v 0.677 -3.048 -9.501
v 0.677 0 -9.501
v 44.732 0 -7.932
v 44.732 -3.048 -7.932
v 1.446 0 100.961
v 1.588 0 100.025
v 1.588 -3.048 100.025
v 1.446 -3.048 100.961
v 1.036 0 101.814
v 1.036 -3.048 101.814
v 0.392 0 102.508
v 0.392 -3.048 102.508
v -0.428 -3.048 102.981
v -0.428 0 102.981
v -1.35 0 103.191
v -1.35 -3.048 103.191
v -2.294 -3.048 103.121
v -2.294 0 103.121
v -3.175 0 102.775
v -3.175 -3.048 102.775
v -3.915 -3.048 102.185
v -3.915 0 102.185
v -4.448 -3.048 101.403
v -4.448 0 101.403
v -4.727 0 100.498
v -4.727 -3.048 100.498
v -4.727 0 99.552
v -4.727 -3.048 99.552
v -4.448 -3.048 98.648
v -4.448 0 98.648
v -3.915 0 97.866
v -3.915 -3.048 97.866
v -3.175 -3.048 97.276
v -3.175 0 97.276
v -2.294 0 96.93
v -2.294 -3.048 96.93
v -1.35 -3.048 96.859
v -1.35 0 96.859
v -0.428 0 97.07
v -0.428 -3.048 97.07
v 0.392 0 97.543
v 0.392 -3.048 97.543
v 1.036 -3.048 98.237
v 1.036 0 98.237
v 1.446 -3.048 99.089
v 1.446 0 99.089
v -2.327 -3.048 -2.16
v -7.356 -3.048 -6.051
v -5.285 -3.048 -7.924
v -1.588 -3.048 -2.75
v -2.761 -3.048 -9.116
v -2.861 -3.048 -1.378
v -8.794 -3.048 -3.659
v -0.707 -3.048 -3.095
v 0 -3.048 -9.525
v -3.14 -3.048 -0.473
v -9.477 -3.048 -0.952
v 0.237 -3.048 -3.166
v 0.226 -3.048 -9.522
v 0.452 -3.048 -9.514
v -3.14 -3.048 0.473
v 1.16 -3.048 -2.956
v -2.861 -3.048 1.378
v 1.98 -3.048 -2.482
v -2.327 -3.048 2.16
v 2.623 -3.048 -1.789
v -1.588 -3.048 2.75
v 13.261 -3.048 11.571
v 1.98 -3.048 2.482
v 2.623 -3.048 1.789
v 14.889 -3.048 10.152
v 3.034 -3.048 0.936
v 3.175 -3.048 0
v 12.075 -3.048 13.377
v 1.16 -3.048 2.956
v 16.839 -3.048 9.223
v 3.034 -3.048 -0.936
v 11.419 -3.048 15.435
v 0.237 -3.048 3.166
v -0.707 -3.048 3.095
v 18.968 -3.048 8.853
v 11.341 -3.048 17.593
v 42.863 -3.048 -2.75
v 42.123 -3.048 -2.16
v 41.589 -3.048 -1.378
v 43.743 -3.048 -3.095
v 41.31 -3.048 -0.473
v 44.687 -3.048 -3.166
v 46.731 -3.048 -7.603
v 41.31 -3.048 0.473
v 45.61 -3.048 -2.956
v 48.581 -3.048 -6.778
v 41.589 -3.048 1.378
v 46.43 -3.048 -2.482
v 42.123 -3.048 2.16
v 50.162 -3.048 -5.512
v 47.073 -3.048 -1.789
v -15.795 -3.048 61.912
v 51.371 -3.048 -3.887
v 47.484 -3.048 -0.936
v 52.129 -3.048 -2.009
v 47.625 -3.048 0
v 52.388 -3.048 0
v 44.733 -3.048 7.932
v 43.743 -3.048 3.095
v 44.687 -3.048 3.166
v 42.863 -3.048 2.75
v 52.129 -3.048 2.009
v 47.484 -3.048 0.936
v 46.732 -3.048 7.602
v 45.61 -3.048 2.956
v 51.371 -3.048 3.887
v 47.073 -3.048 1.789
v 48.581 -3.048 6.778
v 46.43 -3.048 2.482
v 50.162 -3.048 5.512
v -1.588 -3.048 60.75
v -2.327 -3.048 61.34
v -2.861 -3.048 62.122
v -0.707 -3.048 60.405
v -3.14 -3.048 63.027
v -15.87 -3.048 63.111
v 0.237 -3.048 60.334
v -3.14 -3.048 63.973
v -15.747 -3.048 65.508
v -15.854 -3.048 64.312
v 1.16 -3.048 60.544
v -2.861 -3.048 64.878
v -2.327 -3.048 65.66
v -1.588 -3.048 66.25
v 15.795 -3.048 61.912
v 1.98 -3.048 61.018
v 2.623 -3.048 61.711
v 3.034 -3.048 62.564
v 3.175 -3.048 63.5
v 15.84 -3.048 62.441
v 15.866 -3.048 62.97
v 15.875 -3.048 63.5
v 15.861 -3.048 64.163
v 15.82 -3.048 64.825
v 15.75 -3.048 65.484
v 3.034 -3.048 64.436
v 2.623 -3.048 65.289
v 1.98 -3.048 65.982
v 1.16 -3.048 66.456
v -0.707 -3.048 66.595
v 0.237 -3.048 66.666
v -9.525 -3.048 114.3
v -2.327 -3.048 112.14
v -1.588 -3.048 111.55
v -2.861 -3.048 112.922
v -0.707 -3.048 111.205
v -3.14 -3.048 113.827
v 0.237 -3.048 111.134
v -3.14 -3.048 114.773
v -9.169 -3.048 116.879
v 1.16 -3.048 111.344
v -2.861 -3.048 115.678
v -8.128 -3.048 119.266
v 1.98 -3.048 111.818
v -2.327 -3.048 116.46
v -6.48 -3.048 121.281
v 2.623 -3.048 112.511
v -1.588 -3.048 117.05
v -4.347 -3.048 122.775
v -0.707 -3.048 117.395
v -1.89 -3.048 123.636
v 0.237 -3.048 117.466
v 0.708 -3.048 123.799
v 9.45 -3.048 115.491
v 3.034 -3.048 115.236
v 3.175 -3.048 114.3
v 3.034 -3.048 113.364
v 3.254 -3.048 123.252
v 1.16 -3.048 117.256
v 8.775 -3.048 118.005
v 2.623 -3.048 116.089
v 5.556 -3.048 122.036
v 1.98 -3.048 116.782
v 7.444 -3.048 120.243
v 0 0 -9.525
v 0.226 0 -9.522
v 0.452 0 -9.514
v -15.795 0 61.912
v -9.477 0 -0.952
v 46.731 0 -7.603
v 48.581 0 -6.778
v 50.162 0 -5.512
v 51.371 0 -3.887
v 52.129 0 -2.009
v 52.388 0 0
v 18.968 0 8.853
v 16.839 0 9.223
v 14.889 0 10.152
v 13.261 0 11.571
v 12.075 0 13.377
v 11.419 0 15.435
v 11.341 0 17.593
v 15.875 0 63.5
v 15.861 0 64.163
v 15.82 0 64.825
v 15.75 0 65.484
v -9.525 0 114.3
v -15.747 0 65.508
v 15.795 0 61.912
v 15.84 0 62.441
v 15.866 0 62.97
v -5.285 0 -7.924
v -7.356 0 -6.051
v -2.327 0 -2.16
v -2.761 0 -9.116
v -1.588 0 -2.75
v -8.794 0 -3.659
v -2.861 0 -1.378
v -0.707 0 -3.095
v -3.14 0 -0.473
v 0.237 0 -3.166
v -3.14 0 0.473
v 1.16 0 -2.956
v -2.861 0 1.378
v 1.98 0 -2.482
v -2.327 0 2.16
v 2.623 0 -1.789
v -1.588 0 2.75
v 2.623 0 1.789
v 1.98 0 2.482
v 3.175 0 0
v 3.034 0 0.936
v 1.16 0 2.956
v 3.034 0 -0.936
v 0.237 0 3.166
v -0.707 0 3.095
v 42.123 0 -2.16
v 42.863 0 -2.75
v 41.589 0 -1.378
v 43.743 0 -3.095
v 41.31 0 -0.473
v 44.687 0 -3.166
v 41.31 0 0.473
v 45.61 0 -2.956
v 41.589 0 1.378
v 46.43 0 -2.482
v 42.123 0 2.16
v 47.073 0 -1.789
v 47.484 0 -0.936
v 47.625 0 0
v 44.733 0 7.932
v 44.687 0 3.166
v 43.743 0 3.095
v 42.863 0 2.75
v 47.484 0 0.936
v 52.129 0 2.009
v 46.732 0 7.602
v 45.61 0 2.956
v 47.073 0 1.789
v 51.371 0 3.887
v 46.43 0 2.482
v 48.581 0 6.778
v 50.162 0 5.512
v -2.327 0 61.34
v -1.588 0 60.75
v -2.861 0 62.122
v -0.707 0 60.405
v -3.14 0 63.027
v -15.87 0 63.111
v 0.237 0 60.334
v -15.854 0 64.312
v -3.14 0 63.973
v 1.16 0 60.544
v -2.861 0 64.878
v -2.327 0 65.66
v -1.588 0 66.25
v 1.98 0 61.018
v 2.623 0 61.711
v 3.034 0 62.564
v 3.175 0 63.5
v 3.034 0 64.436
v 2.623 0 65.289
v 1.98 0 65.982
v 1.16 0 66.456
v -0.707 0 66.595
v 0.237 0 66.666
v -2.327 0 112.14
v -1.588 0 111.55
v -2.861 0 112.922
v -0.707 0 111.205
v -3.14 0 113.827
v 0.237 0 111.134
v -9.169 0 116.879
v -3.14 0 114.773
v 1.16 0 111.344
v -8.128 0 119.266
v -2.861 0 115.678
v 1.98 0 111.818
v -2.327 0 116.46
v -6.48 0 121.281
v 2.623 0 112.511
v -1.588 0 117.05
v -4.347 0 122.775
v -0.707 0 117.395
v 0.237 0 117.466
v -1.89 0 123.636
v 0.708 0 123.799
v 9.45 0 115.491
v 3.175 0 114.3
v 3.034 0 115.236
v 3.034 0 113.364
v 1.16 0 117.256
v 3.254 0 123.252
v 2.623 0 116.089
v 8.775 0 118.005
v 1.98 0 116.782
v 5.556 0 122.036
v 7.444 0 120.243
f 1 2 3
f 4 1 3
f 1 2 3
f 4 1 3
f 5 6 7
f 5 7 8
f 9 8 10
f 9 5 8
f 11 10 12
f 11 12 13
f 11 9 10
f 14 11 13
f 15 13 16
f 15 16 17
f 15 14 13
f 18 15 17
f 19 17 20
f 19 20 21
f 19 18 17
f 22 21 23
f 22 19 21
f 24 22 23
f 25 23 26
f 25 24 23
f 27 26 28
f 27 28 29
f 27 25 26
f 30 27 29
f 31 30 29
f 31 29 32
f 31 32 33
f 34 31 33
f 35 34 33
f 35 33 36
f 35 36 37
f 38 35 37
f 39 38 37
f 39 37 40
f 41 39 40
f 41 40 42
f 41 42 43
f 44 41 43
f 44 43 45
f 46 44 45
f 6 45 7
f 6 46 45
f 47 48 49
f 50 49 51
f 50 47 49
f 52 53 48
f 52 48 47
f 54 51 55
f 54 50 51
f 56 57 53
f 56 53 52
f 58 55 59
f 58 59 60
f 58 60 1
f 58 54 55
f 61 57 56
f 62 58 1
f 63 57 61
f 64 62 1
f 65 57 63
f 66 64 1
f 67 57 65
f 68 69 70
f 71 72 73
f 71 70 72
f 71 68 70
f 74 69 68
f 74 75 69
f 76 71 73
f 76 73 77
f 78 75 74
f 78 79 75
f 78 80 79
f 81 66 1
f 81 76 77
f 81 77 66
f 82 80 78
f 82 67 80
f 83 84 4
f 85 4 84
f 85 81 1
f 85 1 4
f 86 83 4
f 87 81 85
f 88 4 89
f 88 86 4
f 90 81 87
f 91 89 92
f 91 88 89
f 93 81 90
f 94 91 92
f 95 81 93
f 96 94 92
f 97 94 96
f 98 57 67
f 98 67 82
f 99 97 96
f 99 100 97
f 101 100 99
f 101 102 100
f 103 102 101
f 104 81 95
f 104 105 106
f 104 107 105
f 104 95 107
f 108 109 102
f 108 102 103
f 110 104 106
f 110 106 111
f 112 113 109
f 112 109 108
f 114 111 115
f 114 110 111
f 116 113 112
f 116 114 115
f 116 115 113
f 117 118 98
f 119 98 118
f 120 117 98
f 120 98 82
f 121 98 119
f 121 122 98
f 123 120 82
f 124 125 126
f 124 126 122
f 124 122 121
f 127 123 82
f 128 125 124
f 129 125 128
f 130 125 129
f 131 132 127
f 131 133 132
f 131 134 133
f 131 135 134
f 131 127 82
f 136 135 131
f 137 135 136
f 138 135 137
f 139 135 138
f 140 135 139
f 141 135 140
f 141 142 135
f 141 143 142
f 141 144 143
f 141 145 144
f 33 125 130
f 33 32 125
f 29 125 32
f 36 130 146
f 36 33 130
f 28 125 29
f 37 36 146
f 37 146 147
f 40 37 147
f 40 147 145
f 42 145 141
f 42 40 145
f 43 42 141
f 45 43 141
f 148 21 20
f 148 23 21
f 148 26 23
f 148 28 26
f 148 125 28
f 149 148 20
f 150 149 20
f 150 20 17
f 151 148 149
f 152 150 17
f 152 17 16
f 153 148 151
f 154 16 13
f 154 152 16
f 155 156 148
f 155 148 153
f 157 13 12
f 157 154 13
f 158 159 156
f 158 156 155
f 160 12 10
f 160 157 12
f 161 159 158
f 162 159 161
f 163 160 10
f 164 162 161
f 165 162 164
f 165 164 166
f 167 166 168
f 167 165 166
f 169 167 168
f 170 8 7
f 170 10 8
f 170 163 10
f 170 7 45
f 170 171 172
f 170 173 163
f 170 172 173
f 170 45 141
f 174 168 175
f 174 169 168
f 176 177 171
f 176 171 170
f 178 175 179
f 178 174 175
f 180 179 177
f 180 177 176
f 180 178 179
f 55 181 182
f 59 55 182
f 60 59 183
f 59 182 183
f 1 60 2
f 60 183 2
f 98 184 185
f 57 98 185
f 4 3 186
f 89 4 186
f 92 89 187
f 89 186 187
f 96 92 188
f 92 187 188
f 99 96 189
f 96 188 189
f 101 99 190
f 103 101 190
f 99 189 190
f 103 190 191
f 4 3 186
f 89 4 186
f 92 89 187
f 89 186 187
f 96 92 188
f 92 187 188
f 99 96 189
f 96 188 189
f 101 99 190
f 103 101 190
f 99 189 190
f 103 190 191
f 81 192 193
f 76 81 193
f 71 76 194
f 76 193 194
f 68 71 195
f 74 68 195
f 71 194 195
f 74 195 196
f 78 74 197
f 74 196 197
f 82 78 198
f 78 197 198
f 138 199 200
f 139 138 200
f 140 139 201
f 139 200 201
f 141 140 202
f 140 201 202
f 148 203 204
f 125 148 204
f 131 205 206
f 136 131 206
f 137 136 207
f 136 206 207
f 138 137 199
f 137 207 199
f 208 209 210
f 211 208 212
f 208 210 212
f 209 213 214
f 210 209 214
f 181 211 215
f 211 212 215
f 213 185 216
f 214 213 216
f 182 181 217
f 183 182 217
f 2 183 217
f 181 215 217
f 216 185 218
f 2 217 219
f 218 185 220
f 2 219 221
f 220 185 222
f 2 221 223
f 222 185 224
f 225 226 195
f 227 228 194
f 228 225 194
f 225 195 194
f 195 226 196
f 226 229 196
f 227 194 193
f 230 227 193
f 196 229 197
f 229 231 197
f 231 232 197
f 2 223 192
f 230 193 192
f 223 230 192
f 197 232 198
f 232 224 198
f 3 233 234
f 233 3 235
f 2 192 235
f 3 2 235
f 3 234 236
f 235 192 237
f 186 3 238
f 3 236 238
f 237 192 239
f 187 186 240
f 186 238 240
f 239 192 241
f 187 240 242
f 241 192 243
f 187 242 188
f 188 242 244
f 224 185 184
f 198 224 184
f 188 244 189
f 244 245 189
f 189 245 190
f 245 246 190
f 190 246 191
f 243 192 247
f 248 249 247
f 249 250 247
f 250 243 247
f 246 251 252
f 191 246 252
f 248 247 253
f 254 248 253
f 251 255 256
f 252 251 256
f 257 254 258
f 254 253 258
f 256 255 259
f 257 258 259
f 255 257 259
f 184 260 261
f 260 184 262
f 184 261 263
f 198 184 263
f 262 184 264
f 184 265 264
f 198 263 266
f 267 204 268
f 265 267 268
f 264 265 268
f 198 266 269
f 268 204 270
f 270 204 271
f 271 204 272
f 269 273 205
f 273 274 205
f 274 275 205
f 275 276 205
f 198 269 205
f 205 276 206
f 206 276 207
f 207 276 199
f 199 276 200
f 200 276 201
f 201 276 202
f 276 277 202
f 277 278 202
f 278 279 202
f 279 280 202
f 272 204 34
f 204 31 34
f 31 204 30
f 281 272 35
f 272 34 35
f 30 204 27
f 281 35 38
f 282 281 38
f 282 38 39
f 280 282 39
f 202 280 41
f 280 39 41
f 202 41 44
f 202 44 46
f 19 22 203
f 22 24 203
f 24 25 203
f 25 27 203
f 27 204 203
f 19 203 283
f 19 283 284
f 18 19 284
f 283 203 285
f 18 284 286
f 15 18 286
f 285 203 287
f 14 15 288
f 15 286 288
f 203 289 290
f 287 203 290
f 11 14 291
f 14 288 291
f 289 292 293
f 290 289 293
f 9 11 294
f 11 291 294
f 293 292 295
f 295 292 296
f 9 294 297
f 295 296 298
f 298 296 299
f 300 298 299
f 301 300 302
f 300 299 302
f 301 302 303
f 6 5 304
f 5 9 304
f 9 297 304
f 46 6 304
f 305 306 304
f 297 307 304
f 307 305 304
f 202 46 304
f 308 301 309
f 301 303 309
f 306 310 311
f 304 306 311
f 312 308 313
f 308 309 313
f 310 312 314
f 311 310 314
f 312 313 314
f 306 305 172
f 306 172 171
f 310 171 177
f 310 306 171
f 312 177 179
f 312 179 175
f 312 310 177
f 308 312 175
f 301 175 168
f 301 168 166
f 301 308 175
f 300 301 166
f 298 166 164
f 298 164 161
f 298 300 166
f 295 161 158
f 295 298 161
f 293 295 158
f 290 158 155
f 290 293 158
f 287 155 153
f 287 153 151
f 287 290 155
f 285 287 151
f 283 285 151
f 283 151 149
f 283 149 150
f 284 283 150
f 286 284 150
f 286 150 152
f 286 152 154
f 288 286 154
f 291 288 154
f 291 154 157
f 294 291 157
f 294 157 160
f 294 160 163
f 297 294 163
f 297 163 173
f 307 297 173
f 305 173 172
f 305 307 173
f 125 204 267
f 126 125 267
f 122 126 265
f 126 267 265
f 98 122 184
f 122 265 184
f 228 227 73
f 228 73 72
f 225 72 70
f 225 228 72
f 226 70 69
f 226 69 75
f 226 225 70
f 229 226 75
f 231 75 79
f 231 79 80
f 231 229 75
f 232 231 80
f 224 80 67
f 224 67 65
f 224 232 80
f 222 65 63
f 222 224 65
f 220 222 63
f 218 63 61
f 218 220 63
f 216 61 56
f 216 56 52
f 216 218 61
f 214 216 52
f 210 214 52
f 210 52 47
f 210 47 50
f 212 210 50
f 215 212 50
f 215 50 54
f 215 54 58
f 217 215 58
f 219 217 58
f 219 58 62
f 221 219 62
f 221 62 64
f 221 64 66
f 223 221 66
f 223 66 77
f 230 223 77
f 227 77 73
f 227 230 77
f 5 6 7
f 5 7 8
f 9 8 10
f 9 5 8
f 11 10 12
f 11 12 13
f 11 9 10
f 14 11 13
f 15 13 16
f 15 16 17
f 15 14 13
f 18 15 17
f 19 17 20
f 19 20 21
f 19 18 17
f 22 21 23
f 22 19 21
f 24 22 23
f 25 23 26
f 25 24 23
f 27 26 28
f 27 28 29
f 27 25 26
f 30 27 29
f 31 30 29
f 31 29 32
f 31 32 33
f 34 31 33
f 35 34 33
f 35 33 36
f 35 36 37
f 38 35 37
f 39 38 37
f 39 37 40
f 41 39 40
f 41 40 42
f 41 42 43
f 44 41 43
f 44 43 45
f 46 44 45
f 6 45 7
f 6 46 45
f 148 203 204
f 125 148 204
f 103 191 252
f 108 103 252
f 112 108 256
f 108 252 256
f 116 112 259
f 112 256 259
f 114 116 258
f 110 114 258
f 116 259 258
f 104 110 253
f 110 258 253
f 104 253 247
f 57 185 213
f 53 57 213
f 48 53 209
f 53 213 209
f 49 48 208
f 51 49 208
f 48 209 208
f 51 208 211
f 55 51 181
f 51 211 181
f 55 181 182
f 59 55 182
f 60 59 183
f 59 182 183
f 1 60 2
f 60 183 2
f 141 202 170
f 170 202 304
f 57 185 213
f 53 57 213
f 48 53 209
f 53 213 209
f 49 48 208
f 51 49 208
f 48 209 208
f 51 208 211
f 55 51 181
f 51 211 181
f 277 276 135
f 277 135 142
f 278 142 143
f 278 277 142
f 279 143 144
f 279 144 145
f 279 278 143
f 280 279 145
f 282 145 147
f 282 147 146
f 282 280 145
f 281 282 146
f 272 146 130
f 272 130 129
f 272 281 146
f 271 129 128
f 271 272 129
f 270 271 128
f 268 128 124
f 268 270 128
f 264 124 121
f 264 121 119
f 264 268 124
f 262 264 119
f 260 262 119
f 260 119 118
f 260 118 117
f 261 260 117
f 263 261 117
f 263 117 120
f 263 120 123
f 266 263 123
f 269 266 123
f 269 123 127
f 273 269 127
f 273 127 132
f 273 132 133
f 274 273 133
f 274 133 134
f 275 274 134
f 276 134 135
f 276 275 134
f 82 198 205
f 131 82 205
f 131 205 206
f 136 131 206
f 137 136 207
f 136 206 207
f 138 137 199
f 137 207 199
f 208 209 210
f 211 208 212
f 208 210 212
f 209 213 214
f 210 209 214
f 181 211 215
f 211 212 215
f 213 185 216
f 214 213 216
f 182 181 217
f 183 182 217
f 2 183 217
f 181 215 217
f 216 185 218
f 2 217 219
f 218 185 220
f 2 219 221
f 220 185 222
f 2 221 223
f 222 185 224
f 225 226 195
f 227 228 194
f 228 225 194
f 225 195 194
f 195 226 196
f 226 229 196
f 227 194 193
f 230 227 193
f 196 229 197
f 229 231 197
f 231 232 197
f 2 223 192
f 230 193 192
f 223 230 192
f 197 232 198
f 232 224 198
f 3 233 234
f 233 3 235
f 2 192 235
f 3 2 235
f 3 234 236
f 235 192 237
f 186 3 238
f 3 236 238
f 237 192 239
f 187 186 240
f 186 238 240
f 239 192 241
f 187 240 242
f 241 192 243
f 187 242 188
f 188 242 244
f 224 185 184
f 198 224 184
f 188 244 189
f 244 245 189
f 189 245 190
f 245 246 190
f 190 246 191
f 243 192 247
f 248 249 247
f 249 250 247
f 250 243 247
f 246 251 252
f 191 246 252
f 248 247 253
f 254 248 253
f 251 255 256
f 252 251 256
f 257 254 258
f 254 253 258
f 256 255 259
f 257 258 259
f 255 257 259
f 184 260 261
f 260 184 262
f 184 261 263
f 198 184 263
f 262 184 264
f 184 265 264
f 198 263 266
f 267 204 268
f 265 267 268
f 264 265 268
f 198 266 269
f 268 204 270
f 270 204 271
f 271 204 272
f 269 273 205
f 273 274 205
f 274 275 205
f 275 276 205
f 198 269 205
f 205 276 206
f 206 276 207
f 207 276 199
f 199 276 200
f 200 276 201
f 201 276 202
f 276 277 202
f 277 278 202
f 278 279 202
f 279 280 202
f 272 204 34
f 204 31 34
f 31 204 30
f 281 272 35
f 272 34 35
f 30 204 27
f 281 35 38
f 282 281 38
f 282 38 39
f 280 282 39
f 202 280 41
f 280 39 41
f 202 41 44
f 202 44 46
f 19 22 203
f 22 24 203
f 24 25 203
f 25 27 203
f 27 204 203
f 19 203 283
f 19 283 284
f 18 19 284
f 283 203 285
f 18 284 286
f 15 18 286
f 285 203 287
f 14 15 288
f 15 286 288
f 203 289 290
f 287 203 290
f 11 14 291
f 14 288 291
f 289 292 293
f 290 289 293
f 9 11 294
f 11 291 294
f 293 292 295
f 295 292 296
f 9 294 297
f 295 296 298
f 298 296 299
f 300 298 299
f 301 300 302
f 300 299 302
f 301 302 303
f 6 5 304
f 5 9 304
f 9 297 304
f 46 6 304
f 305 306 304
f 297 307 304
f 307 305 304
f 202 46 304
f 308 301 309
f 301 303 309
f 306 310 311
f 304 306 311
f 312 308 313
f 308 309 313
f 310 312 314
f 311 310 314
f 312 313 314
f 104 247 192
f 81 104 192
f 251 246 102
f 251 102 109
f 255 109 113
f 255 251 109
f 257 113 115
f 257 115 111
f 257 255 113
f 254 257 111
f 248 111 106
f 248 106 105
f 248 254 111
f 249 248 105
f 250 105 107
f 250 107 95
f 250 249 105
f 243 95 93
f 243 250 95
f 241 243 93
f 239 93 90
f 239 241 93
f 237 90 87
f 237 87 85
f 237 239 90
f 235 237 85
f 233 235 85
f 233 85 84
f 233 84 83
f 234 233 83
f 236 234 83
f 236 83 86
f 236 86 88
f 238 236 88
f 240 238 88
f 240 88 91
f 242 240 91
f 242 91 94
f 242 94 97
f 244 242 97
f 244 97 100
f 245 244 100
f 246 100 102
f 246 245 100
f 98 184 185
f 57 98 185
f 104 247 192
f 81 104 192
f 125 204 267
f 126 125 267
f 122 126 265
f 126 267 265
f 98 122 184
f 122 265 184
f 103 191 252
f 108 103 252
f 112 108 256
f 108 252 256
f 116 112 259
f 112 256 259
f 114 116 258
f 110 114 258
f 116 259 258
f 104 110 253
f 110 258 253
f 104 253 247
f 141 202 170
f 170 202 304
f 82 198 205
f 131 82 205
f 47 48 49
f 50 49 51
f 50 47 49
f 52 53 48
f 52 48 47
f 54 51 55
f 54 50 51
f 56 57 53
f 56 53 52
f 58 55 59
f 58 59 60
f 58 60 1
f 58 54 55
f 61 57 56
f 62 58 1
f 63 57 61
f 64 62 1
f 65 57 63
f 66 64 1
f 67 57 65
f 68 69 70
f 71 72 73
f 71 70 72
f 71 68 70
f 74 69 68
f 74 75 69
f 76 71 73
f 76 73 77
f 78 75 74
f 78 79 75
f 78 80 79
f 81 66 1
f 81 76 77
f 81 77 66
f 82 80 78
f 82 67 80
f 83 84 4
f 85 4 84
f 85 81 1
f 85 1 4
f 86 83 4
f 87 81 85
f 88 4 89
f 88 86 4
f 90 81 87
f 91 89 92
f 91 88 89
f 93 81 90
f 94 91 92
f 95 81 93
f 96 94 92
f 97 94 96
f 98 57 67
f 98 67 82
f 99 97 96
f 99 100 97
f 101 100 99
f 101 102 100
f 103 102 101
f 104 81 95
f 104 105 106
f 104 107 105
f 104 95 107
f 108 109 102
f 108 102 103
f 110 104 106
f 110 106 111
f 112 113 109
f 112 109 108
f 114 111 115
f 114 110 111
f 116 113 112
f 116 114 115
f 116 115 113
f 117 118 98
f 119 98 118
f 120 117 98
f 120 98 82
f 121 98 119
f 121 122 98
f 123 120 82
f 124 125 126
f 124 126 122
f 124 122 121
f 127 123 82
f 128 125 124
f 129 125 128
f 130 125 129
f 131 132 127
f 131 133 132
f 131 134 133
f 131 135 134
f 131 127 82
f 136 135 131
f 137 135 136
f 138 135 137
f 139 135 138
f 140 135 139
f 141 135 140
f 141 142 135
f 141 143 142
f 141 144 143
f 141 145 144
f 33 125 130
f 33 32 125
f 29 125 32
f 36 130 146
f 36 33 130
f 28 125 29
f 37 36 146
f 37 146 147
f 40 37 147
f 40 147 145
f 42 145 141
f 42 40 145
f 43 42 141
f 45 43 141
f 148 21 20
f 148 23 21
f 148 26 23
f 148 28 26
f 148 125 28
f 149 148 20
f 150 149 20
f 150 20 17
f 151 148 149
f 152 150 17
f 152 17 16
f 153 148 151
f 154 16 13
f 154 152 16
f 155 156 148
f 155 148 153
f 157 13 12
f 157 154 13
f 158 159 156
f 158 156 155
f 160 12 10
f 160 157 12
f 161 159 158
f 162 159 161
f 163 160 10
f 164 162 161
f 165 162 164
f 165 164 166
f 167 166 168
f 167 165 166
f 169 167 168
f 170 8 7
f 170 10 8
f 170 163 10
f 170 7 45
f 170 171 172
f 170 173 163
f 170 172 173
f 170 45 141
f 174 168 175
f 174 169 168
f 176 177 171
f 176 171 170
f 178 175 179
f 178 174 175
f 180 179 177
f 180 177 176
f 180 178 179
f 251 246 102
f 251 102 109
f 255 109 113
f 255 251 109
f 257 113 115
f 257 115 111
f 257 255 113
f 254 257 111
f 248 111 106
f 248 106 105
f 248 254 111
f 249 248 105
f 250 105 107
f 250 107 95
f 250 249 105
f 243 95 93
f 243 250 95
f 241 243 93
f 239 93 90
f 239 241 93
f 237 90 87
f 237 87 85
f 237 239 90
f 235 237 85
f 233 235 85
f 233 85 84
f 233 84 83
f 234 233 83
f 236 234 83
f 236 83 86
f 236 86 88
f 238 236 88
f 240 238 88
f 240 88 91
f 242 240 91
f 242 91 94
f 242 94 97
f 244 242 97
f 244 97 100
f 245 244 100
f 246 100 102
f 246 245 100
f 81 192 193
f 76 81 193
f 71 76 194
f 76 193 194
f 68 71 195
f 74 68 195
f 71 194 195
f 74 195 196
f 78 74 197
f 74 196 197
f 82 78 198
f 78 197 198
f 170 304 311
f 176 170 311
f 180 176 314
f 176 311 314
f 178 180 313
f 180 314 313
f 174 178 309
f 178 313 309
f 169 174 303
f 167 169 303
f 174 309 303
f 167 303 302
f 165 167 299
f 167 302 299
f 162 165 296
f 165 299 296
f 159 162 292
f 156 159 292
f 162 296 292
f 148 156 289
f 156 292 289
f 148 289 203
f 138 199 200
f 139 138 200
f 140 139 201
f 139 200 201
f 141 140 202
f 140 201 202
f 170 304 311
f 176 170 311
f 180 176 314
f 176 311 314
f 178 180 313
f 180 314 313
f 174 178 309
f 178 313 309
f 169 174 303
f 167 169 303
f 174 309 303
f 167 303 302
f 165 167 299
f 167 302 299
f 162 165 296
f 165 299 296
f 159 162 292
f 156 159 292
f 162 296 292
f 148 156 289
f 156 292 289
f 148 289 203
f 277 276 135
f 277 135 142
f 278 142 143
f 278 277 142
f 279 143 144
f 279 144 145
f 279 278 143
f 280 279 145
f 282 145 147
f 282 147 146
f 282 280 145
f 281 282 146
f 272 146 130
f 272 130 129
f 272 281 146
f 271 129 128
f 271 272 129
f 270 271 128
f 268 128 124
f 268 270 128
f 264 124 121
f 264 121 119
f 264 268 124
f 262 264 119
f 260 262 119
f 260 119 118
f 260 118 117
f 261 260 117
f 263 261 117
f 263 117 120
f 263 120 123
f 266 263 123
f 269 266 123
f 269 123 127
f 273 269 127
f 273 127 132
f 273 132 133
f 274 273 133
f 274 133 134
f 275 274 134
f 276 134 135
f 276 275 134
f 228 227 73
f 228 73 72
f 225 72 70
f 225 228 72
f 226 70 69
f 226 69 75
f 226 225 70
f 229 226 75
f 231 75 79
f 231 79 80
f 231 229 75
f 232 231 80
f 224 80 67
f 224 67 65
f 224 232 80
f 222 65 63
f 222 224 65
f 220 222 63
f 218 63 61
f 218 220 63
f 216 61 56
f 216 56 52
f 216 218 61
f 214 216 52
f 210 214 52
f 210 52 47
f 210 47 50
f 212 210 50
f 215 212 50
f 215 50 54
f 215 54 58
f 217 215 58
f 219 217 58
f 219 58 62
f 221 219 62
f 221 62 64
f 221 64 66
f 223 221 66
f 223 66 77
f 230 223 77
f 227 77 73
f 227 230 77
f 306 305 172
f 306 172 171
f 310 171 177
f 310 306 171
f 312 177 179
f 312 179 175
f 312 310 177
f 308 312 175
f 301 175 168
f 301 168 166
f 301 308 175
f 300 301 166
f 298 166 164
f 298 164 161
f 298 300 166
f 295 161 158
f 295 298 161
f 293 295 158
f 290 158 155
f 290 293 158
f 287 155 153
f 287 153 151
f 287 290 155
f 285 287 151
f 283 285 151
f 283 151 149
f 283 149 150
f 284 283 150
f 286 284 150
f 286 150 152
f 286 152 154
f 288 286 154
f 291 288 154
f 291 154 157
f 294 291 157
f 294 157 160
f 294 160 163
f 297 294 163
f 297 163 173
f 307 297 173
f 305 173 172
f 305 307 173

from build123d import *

# Parameters (mm, degrees)
F0_R     = 3.175
F1_DEPTH = 3.048
F2_DEPTH = 3.048


with BuildPart() as f1:
    # F0 (on Front) → F1 (new body)
    with BuildSketch(Plane.XZ):
        with BuildLine():
            ThreePointArc((-9.525, 114.3), (0, 104.775), (9.525, 114.3))
            ThreePointArc((9.525, 114.3), (9.506305, 114.896483), (9.450293, 115.490625))
            ThreePointArc((9.450293, 115.490625), (-0.596483, 123.806305), (-9.525, 114.3))
        make_face()
        with Locations((0, 114.3)):
            Circle(F0_R, mode=Mode.SUBTRACT)
        with BuildLine():
            ThreePointArc((9.450293, 115.490625), (9.506305, 114.896483), (9.525, 114.3))
            ThreePointArc((9.525, 114.3), (0, 104.775), (-9.525, 114.3))
            Line((-9.525, 114.3), (-15.747457, 65.508289))
            ThreePointArc((-15.747457, 65.508289), (0.012053, 79.374995), (15.750488, 65.484375))
            Line((15.750488, 65.484375), (9.450293, 115.490625))
        make_face()
        with Locations((-1.5875, 100.0252)):
            Circle(F0_R, mode=Mode.SUBTRACT)
        with BuildLine():
            ThreePointArc((15.875, 63.5), (15.843841, 64.494139), (15.750488, 65.484375))
            ThreePointArc((15.750488, 65.484375), (0.012053, 79.374995), (-15.747457, 65.508289))
            ThreePointArc((-15.747457, 65.508289), (-15.873588, 63.711757), (-15.795426, 61.9125))
            ThreePointArc((-15.795426, 61.9125), (0, 47.625), (15.795426, 61.9125))
            ThreePointArc((15.795426, 61.9125), (15.855094, 62.705253), (15.875, 63.5))
        make_face()
        with Locations((0, 63.5)):
            Circle(F0_R, mode=Mode.SUBTRACT)
        with BuildLine():
            ThreePointArc((15.795426, 61.9125), (0, 47.625), (-15.795426, 61.9125))
            Line((-15.795426, 61.9125), (-9.477255, -0.9525))
            ThreePointArc((-9.477255, -0.9525), (-0.476848, 9.513056), (9.525, 0))
            ThreePointArc((9.525, 0), (6.970557, -6.491299), (0.677344, -9.500886))
            Line((0.677344, -9.500886), (44.732405, -7.932475))
            ThreePointArc((44.732405, -7.932475), (36.5125, 0.000539), (44.733482, 7.932436))
            Line((44.733482, 7.932436), (18.9676, 8.853234))
            ThreePointArc((18.9676, 8.853234), (13.2612, 11.571359), (11.341187, 17.593382))
            Line((11.341187, 17.593382), (15.795426, 61.9125))
        make_face()
        with BuildLine():
            ThreePointArc((9.525, 0), (-0.476848, 9.513056), (-9.477255, -0.9525))
            ThreePointArc((-9.477255, -0.9525), (-6.389564, -7.063929), (0, -9.525))
            Line((0, -9.525), (0.677344, -9.500886))
            ThreePointArc((0.677344, -9.500886), (6.970557, -6.491299), (9.525, 0))
        make_face()
        Circle(F0_R, mode=Mode.SUBTRACT)
        with BuildLine():
            Line((0.677344, -9.500886), (0, -9.525))
            ThreePointArc((0, -9.525), (0.338886, -9.51897), (0.677344, -9.500886))
        make_face()
        with BuildLine():
            ThreePointArc((52.3875, 0), (50.162007, 5.511523), (44.733482, 7.932436))
            ThreePointArc((44.733482, 7.932436), (36.5125, 0.000539), (44.732405, -7.932475))
            ThreePointArc((44.732405, -7.932475), (50.161633, -5.51191), (52.3875, 0))
        make_face()
        with Locations((44.45, 0)):
            Circle(F0_R, mode=Mode.SUBTRACT)
    extrude(amount=F1_DEPTH)


with BuildPart() as f2:
    # F0 (on Front) → F2 (new body)
    with BuildSketch(Plane.XZ):
        with BuildLine():
            ThreePointArc((-9.525, 114.3), (0, 104.775), (9.525, 114.3))
            ThreePointArc((9.525, 114.3), (9.506305, 114.896483), (9.450293, 115.490625))
            ThreePointArc((9.450293, 115.490625), (-0.596483, 123.806305), (-9.525, 114.3))
        make_face()
        with Locations((0, 114.3)):
            Circle(F0_R, mode=Mode.SUBTRACT)
        with BuildLine():
            ThreePointArc((9.450293, 115.490625), (9.506305, 114.896483), (9.525, 114.3))
            ThreePointArc((9.525, 114.3), (0, 104.775), (-9.525, 114.3))
            Line((-9.525, 114.3), (-15.747457, 65.508289))
            ThreePointArc((-15.747457, 65.508289), (0.012053, 79.374995), (15.750488, 65.484375))
            Line((15.750488, 65.484375), (9.450293, 115.490625))
        make_face()
        with Locations((-1.5875, 100.0252)):
            Circle(F0_R, mode=Mode.SUBTRACT)
        with BuildLine():
            ThreePointArc((15.875, 63.5), (15.843841, 64.494139), (15.750488, 65.484375))
            ThreePointArc((15.750488, 65.484375), (0.012053, 79.374995), (-15.747457, 65.508289))
            ThreePointArc((-15.747457, 65.508289), (-15.873588, 63.711757), (-15.795426, 61.9125))
            ThreePointArc((-15.795426, 61.9125), (0, 47.625), (15.795426, 61.9125))
            ThreePointArc((15.795426, 61.9125), (15.855094, 62.705253), (15.875, 63.5))
        make_face()
        with Locations((0, 63.5)):
            Circle(F0_R, mode=Mode.SUBTRACT)
        with BuildLine():
            ThreePointArc((15.795426, 61.9125), (0, 47.625), (-15.795426, 61.9125))
            Line((-15.795426, 61.9125), (-9.477255, -0.9525))
            ThreePointArc((-9.477255, -0.9525), (-0.476848, 9.513056), (9.525, 0))
            ThreePointArc((9.525, 0), (6.970557, -6.491299), (0.677344, -9.500886))
            Line((0.677344, -9.500886), (44.732405, -7.932475))
            ThreePointArc((44.732405, -7.932475), (36.5125, 0.000539), (44.733482, 7.932436))
            Line((44.733482, 7.932436), (18.9676, 8.853234))
            ThreePointArc((18.9676, 8.853234), (13.2612, 11.571359), (11.341187, 17.593382))
            Line((11.341187, 17.593382), (15.795426, 61.9125))
        make_face()
        with BuildLine():
            ThreePointArc((9.525, 0), (-0.476848, 9.513056), (-9.477255, -0.9525))
            ThreePointArc((-9.477255, -0.9525), (-6.389564, -7.063929), (0, -9.525))
            Line((0, -9.525), (0.677344, -9.500886))
            ThreePointArc((0.677344, -9.500886), (6.970557, -6.491299), (9.525, 0))
        make_face()
        Circle(F0_R, mode=Mode.SUBTRACT)
        with BuildLine():
            Line((0.677344, -9.500886), (0, -9.525))
            ThreePointArc((0, -9.525), (0.338886, -9.51897), (0.677344, -9.500886))
        make_face()
        with BuildLine():
            ThreePointArc((52.3875, 0), (50.162007, 5.511523), (44.733482, 7.932436))
            ThreePointArc((44.733482, 7.932436), (36.5125, 0.000539), (44.732405, -7.932475))
            ThreePointArc((44.732405, -7.932475), (50.161633, -5.51191), (52.3875, 0))
        make_face()
        with Locations((44.45, 0)):
            Circle(F0_R, mode=Mode.SUBTRACT)
    extrude(amount=F2_DEPTH)


solid = Compound([f1.part, f2.part])
